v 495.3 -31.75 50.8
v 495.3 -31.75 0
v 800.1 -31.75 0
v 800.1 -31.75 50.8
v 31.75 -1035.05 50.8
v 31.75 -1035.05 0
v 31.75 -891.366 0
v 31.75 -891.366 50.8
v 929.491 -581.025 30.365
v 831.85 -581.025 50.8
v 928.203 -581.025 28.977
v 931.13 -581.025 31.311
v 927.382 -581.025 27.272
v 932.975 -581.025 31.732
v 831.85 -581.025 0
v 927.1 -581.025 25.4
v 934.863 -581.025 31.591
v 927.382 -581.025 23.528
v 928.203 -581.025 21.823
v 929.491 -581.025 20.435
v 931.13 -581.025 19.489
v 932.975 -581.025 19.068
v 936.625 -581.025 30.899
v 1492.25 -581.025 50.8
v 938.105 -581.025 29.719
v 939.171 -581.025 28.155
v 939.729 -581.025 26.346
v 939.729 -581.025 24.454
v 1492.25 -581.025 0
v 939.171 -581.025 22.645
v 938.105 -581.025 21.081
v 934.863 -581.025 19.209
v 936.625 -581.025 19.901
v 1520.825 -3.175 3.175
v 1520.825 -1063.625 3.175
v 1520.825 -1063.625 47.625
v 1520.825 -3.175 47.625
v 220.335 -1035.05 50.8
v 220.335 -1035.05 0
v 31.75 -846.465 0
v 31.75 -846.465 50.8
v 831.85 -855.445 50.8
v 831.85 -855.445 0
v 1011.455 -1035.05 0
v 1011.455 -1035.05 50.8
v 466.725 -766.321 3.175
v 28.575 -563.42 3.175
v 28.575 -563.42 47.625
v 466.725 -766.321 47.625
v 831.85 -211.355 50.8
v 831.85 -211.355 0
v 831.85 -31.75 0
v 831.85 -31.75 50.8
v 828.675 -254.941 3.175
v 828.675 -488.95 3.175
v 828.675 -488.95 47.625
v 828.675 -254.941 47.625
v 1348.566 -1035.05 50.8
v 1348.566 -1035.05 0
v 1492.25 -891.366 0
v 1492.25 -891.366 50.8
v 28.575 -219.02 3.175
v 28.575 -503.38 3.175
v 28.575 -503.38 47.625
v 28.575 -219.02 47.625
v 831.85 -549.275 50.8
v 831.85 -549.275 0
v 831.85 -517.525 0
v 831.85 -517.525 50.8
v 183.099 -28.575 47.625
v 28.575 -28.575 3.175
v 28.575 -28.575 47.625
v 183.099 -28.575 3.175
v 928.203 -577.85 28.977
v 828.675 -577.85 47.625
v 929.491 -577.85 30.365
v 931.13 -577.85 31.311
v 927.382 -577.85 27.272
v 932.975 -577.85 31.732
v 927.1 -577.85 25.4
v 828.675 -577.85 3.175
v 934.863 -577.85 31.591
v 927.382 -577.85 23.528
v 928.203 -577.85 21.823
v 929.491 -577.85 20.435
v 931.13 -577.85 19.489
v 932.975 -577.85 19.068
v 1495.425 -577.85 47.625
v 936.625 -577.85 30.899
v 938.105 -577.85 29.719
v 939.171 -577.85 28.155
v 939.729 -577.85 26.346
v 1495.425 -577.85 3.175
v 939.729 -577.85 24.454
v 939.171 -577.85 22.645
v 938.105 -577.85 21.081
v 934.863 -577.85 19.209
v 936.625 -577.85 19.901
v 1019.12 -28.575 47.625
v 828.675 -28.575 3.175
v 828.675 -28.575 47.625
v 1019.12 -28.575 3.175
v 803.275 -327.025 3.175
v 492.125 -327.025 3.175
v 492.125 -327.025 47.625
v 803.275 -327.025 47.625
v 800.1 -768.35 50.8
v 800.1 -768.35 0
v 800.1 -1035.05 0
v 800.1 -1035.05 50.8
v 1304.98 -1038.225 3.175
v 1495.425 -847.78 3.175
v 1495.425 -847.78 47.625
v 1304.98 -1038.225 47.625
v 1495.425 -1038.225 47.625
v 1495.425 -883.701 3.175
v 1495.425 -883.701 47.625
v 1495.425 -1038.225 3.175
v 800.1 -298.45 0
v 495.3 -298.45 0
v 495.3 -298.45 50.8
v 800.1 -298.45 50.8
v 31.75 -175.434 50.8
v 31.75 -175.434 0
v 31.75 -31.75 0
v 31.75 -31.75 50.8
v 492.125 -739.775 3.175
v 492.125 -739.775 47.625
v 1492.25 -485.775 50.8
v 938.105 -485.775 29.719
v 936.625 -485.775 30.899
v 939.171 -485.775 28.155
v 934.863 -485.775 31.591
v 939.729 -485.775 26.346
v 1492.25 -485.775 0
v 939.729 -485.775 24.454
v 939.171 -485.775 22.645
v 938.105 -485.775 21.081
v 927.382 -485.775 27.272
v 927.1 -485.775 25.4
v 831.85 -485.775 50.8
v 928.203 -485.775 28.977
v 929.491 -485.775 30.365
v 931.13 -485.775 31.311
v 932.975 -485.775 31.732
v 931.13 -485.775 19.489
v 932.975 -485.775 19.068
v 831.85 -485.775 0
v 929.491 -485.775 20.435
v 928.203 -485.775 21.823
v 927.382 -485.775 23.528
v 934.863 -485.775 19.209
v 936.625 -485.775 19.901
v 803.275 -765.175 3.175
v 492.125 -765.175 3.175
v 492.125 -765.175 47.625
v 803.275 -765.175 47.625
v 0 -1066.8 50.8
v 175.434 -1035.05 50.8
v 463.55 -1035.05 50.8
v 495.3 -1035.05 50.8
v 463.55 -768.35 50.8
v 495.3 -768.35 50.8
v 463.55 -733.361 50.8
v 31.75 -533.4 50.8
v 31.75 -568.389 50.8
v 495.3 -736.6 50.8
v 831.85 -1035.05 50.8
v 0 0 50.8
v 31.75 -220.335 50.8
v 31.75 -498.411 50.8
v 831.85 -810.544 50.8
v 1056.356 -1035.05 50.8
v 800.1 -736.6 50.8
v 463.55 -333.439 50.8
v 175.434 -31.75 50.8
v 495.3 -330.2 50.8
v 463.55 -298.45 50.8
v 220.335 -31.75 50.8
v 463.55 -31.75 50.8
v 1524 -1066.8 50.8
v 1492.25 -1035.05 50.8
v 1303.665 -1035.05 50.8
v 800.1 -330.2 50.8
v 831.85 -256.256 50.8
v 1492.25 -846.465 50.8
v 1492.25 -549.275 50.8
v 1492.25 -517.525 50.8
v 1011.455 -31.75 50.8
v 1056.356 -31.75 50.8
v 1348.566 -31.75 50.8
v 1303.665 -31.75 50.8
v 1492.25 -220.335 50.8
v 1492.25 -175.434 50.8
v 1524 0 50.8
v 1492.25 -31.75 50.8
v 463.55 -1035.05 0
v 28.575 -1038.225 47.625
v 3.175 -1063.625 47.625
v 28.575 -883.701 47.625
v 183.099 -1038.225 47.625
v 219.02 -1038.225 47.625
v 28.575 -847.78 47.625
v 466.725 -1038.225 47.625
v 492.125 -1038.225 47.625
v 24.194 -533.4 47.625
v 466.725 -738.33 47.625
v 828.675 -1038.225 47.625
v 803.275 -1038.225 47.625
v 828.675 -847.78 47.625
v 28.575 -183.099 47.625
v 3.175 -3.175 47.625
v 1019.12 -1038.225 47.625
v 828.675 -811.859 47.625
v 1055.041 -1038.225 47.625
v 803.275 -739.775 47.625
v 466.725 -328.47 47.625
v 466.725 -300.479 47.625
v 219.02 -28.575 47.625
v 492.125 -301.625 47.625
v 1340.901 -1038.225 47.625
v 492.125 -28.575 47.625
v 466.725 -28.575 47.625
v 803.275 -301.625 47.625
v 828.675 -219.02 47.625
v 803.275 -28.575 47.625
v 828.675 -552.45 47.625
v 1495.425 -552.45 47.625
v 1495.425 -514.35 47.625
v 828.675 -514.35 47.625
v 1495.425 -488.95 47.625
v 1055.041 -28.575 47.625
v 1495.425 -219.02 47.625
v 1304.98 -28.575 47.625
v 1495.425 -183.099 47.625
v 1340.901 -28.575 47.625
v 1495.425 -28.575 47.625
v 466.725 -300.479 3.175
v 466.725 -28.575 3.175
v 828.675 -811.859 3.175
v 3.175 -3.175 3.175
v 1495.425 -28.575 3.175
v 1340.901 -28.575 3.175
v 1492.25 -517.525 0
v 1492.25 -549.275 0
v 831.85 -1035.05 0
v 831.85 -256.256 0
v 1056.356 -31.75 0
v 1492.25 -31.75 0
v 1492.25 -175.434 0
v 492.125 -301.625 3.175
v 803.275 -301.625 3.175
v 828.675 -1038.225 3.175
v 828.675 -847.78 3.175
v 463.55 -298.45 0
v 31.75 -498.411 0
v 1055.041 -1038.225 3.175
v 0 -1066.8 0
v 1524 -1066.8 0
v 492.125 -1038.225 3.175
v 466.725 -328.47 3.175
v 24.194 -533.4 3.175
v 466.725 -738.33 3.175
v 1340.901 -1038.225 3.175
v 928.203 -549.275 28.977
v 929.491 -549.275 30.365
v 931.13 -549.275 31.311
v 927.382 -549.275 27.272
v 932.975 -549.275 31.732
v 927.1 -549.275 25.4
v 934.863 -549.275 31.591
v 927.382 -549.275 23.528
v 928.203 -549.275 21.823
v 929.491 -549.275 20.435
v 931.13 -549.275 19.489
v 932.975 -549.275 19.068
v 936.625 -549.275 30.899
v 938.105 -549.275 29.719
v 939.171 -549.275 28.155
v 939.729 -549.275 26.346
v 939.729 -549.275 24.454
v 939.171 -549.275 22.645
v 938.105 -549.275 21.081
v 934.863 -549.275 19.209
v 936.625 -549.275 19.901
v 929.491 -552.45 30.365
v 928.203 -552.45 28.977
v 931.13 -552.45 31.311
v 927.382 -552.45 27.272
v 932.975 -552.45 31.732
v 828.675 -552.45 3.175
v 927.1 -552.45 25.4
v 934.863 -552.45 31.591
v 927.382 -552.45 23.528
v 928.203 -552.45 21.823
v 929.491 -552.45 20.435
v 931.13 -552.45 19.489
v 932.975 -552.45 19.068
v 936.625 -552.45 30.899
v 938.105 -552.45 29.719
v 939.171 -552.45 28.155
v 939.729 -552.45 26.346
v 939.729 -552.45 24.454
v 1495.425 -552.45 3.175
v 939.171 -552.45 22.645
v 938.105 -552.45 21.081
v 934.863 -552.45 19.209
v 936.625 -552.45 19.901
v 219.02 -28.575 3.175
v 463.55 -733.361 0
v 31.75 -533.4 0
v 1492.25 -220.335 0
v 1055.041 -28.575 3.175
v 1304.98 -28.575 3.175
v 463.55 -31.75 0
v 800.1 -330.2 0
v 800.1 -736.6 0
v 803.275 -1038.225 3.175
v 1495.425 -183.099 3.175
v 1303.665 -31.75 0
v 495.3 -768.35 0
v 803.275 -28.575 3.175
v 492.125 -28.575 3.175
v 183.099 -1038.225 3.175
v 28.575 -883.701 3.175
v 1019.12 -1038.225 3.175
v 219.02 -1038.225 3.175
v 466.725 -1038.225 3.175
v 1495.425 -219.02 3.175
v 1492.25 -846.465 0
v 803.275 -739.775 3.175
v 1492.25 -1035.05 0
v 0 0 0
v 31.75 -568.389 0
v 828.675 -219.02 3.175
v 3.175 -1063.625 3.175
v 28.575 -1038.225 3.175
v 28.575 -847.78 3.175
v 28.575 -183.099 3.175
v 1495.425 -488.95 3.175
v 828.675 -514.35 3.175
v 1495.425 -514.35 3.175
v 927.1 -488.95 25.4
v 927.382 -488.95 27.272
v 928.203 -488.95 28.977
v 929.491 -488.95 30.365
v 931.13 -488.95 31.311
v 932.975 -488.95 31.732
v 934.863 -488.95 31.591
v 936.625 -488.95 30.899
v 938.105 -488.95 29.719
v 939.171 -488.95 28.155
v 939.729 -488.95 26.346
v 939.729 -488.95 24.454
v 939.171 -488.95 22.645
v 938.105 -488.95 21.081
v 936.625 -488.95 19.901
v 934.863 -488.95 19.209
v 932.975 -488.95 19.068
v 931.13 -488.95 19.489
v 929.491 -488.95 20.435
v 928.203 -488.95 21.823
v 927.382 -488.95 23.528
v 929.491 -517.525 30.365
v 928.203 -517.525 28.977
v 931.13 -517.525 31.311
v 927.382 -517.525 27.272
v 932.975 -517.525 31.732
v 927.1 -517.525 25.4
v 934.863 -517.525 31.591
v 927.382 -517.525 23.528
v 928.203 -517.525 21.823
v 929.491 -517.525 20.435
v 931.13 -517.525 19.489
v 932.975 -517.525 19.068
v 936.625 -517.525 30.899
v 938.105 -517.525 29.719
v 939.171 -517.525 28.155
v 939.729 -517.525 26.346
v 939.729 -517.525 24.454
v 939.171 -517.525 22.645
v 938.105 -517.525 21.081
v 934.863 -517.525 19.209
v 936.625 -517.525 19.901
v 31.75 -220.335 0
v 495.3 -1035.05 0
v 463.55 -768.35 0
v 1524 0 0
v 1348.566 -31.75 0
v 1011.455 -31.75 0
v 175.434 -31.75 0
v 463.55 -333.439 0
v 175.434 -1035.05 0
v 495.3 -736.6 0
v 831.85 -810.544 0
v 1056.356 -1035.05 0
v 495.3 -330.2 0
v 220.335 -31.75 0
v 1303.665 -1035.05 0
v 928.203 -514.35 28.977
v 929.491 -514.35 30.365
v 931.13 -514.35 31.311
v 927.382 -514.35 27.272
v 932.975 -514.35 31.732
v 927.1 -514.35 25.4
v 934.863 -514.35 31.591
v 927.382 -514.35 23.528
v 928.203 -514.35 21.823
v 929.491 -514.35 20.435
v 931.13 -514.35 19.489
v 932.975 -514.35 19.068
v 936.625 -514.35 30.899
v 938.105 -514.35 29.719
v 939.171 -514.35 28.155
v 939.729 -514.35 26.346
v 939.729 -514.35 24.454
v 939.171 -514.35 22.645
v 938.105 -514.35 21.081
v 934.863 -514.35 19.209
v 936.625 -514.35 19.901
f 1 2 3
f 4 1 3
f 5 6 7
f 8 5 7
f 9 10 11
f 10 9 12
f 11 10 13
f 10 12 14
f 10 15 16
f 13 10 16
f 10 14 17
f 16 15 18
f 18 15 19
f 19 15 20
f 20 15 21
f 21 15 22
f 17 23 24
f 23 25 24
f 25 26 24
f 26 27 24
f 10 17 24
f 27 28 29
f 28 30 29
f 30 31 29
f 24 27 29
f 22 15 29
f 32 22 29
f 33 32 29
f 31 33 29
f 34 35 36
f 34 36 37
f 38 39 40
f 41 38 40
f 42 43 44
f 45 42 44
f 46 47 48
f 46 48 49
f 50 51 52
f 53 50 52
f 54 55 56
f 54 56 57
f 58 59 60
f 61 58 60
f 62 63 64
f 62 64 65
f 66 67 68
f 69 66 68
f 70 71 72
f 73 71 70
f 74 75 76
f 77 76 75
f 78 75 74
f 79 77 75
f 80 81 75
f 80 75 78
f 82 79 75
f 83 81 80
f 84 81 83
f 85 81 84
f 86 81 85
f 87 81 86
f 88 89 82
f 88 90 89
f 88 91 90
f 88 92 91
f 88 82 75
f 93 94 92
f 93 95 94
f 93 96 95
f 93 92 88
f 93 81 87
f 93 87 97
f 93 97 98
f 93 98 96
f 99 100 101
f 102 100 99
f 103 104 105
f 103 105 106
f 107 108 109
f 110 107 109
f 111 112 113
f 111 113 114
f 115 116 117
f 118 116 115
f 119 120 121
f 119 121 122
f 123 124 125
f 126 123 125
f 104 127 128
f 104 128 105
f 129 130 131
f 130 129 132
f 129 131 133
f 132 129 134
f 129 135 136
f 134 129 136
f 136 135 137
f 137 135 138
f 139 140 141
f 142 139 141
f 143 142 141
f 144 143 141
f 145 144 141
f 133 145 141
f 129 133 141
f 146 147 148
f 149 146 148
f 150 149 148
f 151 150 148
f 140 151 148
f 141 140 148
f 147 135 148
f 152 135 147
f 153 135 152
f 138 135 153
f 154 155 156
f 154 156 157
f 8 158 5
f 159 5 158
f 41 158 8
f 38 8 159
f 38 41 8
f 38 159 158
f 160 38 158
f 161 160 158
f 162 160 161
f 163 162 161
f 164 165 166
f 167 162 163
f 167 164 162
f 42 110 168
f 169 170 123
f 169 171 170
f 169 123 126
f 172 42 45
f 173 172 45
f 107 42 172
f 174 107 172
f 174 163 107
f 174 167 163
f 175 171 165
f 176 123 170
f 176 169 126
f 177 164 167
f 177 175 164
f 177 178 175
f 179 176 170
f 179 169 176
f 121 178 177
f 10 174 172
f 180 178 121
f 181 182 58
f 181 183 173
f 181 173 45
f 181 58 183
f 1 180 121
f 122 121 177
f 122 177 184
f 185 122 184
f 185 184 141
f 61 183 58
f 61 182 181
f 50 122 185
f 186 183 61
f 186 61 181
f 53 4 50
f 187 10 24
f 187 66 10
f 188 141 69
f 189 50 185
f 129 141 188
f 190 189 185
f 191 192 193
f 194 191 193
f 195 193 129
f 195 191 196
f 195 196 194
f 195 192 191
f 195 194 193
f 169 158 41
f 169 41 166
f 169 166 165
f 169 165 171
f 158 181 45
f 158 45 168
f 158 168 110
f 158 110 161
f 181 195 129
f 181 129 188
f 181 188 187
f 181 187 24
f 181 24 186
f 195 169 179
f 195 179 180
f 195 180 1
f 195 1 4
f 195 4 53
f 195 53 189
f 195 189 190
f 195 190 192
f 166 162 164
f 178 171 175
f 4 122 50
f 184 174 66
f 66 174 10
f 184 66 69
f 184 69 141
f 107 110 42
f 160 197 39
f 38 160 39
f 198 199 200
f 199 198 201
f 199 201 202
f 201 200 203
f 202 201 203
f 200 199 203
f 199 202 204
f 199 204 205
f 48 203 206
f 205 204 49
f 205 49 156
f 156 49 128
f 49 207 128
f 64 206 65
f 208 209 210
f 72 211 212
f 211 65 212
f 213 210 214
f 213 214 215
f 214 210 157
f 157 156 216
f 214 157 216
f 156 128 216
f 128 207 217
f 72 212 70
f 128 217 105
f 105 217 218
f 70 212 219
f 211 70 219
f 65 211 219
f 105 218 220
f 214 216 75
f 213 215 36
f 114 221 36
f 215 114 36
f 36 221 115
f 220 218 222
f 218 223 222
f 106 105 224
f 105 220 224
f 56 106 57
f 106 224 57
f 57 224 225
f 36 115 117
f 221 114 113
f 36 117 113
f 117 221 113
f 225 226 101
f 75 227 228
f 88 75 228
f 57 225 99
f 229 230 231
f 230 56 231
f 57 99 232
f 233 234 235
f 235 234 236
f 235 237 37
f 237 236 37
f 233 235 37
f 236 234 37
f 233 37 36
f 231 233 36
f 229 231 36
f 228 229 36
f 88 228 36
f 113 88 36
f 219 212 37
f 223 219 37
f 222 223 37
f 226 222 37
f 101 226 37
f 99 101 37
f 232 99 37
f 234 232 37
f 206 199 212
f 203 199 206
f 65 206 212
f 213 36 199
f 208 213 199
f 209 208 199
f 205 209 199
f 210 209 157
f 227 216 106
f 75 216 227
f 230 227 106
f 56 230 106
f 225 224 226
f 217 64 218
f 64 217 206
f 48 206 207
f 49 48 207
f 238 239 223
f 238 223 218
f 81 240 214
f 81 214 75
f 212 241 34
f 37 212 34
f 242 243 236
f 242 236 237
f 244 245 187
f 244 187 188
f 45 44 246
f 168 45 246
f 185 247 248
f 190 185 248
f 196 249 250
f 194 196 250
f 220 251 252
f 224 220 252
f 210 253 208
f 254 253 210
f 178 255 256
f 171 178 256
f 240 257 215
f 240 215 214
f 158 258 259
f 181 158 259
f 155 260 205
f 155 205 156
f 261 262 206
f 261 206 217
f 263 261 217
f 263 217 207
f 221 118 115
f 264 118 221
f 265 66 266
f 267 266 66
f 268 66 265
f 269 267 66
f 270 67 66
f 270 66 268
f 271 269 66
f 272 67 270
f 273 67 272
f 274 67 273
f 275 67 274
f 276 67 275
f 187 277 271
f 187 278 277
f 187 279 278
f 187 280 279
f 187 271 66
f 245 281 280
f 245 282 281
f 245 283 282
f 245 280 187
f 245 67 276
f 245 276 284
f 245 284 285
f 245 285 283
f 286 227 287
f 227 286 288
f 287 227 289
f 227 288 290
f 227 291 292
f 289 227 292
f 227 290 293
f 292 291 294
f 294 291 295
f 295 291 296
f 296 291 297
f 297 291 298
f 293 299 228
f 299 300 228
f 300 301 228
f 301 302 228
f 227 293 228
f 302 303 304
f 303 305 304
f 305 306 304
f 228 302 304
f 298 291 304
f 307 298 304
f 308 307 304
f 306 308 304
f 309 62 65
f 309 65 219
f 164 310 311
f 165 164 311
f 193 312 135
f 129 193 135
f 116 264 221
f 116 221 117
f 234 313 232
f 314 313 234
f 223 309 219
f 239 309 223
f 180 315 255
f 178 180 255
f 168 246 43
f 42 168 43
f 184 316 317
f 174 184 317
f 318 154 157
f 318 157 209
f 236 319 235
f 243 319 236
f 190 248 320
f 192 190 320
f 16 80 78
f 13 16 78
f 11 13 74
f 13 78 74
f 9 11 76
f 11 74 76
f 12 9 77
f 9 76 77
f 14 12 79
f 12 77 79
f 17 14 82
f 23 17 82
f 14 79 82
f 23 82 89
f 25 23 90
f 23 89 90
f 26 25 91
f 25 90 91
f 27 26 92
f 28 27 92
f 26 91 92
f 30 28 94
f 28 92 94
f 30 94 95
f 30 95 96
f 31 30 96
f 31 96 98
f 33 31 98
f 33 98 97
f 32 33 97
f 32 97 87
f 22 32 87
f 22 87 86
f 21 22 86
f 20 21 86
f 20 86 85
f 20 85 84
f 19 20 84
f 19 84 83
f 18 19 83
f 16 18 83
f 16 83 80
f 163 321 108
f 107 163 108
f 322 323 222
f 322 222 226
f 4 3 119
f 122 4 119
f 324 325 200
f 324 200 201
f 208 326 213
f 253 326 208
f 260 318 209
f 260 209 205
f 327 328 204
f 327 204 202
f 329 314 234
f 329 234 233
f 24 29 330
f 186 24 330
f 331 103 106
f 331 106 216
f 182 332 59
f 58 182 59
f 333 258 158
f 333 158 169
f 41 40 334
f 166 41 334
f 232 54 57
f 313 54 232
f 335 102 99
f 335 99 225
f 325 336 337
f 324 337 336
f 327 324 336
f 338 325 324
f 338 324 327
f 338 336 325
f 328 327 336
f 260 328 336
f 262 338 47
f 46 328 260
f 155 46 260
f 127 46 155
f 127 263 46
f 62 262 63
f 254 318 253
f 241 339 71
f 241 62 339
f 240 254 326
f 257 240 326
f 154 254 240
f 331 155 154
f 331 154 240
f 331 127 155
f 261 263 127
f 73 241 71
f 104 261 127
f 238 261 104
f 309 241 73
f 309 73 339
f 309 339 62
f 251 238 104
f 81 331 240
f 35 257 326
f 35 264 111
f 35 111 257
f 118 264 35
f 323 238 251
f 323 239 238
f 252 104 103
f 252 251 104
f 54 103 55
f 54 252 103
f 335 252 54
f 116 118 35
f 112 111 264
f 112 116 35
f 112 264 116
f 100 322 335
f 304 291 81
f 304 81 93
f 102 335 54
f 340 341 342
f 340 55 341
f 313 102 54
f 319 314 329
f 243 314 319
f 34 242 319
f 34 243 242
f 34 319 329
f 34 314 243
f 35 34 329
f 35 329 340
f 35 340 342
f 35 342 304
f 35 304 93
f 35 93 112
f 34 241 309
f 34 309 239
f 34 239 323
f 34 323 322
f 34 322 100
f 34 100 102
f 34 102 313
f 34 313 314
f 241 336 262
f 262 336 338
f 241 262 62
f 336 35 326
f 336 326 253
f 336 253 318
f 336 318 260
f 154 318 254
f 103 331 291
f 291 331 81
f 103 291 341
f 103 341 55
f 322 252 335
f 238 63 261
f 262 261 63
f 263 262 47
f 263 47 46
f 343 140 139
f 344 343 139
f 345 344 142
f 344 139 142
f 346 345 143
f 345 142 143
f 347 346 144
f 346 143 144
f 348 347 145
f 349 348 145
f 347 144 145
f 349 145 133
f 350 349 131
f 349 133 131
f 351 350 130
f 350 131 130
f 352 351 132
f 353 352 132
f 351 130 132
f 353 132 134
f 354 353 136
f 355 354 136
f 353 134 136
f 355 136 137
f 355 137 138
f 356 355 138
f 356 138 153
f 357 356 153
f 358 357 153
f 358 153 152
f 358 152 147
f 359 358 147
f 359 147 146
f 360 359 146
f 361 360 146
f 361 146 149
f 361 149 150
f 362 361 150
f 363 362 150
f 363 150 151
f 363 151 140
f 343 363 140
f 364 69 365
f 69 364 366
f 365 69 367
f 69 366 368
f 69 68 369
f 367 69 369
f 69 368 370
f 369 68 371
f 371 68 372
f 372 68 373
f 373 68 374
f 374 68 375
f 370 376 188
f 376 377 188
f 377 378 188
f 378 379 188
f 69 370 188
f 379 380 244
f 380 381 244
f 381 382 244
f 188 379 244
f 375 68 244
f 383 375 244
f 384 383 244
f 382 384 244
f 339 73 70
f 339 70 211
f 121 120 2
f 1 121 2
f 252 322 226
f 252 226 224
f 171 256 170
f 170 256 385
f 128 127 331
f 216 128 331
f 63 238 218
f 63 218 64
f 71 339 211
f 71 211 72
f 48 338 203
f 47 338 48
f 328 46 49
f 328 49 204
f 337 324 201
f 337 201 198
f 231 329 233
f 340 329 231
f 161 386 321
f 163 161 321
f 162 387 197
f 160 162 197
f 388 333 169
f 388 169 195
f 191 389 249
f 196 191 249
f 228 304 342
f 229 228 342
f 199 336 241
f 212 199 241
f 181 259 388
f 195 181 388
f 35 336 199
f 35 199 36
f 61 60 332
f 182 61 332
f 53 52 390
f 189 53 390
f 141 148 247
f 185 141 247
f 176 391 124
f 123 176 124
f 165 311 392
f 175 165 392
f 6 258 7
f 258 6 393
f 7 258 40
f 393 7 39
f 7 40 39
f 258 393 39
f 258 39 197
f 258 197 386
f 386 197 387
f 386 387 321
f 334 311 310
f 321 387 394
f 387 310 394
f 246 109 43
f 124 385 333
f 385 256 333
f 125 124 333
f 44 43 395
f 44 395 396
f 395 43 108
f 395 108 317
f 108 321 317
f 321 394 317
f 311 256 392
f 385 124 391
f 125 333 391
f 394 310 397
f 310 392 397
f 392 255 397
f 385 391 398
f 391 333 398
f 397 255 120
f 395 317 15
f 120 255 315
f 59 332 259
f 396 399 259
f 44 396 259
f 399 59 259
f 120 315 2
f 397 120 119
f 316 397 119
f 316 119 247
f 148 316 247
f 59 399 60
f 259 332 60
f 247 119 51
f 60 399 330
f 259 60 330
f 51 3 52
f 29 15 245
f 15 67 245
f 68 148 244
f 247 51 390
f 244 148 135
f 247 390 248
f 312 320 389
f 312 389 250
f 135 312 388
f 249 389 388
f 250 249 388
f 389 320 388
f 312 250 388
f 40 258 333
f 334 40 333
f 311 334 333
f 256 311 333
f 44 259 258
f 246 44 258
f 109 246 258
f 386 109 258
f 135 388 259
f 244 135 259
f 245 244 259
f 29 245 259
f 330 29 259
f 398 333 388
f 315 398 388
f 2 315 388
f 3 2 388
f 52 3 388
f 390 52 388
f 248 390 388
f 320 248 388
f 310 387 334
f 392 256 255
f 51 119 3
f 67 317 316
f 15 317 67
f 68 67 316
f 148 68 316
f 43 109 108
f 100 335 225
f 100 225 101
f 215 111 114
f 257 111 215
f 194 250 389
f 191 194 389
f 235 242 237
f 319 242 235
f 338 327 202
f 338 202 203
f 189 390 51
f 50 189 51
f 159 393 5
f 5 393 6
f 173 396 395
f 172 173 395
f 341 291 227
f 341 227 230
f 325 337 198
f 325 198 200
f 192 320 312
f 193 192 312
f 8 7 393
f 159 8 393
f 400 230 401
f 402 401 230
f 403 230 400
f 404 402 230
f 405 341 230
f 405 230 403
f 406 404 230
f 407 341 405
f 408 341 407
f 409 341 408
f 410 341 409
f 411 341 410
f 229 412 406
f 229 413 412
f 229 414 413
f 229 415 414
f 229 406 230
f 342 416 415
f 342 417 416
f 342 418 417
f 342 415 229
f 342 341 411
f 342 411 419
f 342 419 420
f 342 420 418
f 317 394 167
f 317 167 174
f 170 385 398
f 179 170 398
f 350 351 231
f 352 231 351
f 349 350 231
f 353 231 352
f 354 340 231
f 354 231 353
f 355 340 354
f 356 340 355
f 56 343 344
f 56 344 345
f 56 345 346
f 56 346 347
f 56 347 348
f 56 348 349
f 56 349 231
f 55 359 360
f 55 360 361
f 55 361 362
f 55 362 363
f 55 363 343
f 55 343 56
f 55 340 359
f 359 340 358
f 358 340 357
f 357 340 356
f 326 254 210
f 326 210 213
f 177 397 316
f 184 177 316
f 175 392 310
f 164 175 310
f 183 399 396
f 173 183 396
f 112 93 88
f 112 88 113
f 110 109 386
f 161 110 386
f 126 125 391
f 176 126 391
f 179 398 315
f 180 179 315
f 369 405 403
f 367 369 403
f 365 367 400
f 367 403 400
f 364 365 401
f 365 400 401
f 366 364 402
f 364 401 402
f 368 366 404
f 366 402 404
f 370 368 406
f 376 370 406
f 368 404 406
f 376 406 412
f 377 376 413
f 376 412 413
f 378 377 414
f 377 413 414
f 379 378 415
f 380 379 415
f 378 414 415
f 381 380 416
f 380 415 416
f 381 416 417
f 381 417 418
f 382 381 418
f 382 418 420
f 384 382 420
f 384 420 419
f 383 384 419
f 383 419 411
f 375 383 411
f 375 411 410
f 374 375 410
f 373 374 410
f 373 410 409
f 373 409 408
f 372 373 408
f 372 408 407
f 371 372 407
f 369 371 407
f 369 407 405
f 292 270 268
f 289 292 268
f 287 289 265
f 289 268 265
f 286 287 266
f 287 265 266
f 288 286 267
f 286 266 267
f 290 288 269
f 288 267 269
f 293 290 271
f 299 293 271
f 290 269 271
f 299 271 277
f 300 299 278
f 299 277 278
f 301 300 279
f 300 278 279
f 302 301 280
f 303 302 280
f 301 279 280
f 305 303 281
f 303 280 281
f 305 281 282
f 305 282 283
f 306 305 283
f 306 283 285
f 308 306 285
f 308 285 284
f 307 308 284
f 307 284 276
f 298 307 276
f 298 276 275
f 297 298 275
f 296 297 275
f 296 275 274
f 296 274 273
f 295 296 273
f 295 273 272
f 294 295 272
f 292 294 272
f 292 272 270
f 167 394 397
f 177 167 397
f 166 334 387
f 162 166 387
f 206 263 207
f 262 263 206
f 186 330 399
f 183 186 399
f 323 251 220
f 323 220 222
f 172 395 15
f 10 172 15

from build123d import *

# Parameters (mm, degrees)
F0_W     = 1524
F0_H     = 1066.8
F0_W_2   = 660.4
F0_H_2   = 31.75
F0_W_3   = 304.8
F1_DEPTH = 50.8
F3_R     = 6.35
F4_DEPTH = 127
F5_T     = -3.175


# Not quite as in the source:
# - a feature names something its author has since deleted; it is built from what else it names


with BuildPart() as f1:
    # F0 (on Top) → F1 (new body)
    with BuildSketch(Plane.XY):
        with Locations((762, -533.4)):
            Rectangle(F0_W, F0_H)
        Polygon((1011.4551224214, -1035.05), (831.85, -1035.05), (831.85, -855.4448775786), (831.85, -810.5435969733), (831.85, -581.025), (1492.25, -581.025), (1492.25, -788.03246), (1492.25, -832.48246), (1492.25, -846.4646214575), (1492.25, -891.3659020629), (1492.25, -1035.05), (1348.5659020629, -1035.05), (1303.6646214575, -1035.05), (1056.3564030267, -1035.05), align=None, mode=Mode.SUBTRACT)
        Polygon((31.75, -175.4340979371), (31.75, -31.75), (175.4340979371, -31.75), (220.3353785425, -31.75), (463.55, -31.75), (463.55, -298.45), (463.55, -333.4391527639), (463.55, -733.3608472361), (463.55, -768.35), (463.55, -1035.05), (220.3353785425, -1035.05), (175.4340979371, -1035.05), (31.75, -1035.05), (31.75, -891.3659020629), (31.75, -846.4646214575), (31.75, -832.48246), (31.75, -788.03246), (31.75, -568.3891527639), (31.75, -533.4), (31.75, -498.4108472361), (31.75, -220.3353785425), align=None, mode=Mode.SUBTRACT)
        Polygon((800.1, -1035.05), (495.3, -1035.05), (495.3, -768.35), (495.3, -736.6), (495.3, -330.2), (495.3, -298.45), (495.3, -31.75), (800.1, -31.75), (800.1, -298.45), (800.1, -330.2), (800.1, -736.6), (800.1, -768.35), align=None, mode=Mode.SUBTRACT)
        with Locations((1162.05, -533.4)):
            Rectangle(F0_W_2, F0_H_2, mode=Mode.SUBTRACT)
        Polygon((1348.5659020629, -31.75), (1492.25, -31.75), (1492.25, -175.4340979371), (1492.25, -220.3353785425), (1492.25, -485.775), (831.85, -485.775), (831.85, -256.2564030267), (831.85, -211.3551224214), (831.85, -31.75), (1011.4551224214, -31.75), (1056.3564030267, -31.75), (1303.6646214575, -31.75), align=None, mode=Mode.SUBTRACT)
        Polygon((463.55, -298.45), (31.75, -498.4108472361), (31.75, -533.4), (463.55, -333.4391527639), align=None)
        Polygon((463.55, -733.3608472361), (31.75, -533.4), (31.75, -568.3891527639), (463.55, -768.35), align=None)
        with Locations((647.7, -752.475)):
            Rectangle(F0_W_3, F0_H_2)
        with Locations((647.7, -314.325)):
            Rectangle(F0_W_3, F0_H_2)
        Polygon((831.85, -256.2564030267), (1056.3564030267, -31.75), (1011.4551224214, -31.75), (831.85, -211.3551224214), align=None)
        Polygon((831.85, -810.5435969733), (831.85, -855.4448775786), (1011.4551224214, -1035.05), (1056.3564030267, -1035.05), align=None)
        Polygon((220.3353785425, -31.75), (175.4340979371, -31.75), (31.75, -175.4340979371), (31.75, -220.3353785425), align=None)
        Polygon((220.3353785425, -1035.05), (31.75, -846.4646214575), (31.75, -891.3659020629), (175.4340979371, -1035.05), align=None)
        Polygon((1492.25, -846.4646214575), (1303.6646214575, -1035.05), (1348.5659020629, -1035.05), (1492.25, -891.3659020629), align=None)
        Polygon((1492.25, -220.3353785425), (1492.25, -175.4340979371), (1348.5659020629, -31.75), (1303.6646214575, -31.75), align=None)
    extrude(amount=F1_DEPTH)

    # F3 (on face) → F4 (cut)
    with BuildSketch(Plane(origin=(0, -485.775, 0), x_dir=(-1, 0, 0), z_dir=(0, 1, 0))):
        with Locations((-933.45, 25.4)):
            Circle(F3_R)
    extrude(amount=-F4_DEPTH, mode=Mode.SUBTRACT)

    # F5
    f5_openings = [f1.faces().sort_by_distance(p)[0] for p in [
        (939.8, -565.15, 25.4),
        (939.8, -501.65, 25.4),
    ]]
    offset(amount=F5_T, openings=f5_openings, kind=Kind.INTERSECTION)


solid = f1.part
